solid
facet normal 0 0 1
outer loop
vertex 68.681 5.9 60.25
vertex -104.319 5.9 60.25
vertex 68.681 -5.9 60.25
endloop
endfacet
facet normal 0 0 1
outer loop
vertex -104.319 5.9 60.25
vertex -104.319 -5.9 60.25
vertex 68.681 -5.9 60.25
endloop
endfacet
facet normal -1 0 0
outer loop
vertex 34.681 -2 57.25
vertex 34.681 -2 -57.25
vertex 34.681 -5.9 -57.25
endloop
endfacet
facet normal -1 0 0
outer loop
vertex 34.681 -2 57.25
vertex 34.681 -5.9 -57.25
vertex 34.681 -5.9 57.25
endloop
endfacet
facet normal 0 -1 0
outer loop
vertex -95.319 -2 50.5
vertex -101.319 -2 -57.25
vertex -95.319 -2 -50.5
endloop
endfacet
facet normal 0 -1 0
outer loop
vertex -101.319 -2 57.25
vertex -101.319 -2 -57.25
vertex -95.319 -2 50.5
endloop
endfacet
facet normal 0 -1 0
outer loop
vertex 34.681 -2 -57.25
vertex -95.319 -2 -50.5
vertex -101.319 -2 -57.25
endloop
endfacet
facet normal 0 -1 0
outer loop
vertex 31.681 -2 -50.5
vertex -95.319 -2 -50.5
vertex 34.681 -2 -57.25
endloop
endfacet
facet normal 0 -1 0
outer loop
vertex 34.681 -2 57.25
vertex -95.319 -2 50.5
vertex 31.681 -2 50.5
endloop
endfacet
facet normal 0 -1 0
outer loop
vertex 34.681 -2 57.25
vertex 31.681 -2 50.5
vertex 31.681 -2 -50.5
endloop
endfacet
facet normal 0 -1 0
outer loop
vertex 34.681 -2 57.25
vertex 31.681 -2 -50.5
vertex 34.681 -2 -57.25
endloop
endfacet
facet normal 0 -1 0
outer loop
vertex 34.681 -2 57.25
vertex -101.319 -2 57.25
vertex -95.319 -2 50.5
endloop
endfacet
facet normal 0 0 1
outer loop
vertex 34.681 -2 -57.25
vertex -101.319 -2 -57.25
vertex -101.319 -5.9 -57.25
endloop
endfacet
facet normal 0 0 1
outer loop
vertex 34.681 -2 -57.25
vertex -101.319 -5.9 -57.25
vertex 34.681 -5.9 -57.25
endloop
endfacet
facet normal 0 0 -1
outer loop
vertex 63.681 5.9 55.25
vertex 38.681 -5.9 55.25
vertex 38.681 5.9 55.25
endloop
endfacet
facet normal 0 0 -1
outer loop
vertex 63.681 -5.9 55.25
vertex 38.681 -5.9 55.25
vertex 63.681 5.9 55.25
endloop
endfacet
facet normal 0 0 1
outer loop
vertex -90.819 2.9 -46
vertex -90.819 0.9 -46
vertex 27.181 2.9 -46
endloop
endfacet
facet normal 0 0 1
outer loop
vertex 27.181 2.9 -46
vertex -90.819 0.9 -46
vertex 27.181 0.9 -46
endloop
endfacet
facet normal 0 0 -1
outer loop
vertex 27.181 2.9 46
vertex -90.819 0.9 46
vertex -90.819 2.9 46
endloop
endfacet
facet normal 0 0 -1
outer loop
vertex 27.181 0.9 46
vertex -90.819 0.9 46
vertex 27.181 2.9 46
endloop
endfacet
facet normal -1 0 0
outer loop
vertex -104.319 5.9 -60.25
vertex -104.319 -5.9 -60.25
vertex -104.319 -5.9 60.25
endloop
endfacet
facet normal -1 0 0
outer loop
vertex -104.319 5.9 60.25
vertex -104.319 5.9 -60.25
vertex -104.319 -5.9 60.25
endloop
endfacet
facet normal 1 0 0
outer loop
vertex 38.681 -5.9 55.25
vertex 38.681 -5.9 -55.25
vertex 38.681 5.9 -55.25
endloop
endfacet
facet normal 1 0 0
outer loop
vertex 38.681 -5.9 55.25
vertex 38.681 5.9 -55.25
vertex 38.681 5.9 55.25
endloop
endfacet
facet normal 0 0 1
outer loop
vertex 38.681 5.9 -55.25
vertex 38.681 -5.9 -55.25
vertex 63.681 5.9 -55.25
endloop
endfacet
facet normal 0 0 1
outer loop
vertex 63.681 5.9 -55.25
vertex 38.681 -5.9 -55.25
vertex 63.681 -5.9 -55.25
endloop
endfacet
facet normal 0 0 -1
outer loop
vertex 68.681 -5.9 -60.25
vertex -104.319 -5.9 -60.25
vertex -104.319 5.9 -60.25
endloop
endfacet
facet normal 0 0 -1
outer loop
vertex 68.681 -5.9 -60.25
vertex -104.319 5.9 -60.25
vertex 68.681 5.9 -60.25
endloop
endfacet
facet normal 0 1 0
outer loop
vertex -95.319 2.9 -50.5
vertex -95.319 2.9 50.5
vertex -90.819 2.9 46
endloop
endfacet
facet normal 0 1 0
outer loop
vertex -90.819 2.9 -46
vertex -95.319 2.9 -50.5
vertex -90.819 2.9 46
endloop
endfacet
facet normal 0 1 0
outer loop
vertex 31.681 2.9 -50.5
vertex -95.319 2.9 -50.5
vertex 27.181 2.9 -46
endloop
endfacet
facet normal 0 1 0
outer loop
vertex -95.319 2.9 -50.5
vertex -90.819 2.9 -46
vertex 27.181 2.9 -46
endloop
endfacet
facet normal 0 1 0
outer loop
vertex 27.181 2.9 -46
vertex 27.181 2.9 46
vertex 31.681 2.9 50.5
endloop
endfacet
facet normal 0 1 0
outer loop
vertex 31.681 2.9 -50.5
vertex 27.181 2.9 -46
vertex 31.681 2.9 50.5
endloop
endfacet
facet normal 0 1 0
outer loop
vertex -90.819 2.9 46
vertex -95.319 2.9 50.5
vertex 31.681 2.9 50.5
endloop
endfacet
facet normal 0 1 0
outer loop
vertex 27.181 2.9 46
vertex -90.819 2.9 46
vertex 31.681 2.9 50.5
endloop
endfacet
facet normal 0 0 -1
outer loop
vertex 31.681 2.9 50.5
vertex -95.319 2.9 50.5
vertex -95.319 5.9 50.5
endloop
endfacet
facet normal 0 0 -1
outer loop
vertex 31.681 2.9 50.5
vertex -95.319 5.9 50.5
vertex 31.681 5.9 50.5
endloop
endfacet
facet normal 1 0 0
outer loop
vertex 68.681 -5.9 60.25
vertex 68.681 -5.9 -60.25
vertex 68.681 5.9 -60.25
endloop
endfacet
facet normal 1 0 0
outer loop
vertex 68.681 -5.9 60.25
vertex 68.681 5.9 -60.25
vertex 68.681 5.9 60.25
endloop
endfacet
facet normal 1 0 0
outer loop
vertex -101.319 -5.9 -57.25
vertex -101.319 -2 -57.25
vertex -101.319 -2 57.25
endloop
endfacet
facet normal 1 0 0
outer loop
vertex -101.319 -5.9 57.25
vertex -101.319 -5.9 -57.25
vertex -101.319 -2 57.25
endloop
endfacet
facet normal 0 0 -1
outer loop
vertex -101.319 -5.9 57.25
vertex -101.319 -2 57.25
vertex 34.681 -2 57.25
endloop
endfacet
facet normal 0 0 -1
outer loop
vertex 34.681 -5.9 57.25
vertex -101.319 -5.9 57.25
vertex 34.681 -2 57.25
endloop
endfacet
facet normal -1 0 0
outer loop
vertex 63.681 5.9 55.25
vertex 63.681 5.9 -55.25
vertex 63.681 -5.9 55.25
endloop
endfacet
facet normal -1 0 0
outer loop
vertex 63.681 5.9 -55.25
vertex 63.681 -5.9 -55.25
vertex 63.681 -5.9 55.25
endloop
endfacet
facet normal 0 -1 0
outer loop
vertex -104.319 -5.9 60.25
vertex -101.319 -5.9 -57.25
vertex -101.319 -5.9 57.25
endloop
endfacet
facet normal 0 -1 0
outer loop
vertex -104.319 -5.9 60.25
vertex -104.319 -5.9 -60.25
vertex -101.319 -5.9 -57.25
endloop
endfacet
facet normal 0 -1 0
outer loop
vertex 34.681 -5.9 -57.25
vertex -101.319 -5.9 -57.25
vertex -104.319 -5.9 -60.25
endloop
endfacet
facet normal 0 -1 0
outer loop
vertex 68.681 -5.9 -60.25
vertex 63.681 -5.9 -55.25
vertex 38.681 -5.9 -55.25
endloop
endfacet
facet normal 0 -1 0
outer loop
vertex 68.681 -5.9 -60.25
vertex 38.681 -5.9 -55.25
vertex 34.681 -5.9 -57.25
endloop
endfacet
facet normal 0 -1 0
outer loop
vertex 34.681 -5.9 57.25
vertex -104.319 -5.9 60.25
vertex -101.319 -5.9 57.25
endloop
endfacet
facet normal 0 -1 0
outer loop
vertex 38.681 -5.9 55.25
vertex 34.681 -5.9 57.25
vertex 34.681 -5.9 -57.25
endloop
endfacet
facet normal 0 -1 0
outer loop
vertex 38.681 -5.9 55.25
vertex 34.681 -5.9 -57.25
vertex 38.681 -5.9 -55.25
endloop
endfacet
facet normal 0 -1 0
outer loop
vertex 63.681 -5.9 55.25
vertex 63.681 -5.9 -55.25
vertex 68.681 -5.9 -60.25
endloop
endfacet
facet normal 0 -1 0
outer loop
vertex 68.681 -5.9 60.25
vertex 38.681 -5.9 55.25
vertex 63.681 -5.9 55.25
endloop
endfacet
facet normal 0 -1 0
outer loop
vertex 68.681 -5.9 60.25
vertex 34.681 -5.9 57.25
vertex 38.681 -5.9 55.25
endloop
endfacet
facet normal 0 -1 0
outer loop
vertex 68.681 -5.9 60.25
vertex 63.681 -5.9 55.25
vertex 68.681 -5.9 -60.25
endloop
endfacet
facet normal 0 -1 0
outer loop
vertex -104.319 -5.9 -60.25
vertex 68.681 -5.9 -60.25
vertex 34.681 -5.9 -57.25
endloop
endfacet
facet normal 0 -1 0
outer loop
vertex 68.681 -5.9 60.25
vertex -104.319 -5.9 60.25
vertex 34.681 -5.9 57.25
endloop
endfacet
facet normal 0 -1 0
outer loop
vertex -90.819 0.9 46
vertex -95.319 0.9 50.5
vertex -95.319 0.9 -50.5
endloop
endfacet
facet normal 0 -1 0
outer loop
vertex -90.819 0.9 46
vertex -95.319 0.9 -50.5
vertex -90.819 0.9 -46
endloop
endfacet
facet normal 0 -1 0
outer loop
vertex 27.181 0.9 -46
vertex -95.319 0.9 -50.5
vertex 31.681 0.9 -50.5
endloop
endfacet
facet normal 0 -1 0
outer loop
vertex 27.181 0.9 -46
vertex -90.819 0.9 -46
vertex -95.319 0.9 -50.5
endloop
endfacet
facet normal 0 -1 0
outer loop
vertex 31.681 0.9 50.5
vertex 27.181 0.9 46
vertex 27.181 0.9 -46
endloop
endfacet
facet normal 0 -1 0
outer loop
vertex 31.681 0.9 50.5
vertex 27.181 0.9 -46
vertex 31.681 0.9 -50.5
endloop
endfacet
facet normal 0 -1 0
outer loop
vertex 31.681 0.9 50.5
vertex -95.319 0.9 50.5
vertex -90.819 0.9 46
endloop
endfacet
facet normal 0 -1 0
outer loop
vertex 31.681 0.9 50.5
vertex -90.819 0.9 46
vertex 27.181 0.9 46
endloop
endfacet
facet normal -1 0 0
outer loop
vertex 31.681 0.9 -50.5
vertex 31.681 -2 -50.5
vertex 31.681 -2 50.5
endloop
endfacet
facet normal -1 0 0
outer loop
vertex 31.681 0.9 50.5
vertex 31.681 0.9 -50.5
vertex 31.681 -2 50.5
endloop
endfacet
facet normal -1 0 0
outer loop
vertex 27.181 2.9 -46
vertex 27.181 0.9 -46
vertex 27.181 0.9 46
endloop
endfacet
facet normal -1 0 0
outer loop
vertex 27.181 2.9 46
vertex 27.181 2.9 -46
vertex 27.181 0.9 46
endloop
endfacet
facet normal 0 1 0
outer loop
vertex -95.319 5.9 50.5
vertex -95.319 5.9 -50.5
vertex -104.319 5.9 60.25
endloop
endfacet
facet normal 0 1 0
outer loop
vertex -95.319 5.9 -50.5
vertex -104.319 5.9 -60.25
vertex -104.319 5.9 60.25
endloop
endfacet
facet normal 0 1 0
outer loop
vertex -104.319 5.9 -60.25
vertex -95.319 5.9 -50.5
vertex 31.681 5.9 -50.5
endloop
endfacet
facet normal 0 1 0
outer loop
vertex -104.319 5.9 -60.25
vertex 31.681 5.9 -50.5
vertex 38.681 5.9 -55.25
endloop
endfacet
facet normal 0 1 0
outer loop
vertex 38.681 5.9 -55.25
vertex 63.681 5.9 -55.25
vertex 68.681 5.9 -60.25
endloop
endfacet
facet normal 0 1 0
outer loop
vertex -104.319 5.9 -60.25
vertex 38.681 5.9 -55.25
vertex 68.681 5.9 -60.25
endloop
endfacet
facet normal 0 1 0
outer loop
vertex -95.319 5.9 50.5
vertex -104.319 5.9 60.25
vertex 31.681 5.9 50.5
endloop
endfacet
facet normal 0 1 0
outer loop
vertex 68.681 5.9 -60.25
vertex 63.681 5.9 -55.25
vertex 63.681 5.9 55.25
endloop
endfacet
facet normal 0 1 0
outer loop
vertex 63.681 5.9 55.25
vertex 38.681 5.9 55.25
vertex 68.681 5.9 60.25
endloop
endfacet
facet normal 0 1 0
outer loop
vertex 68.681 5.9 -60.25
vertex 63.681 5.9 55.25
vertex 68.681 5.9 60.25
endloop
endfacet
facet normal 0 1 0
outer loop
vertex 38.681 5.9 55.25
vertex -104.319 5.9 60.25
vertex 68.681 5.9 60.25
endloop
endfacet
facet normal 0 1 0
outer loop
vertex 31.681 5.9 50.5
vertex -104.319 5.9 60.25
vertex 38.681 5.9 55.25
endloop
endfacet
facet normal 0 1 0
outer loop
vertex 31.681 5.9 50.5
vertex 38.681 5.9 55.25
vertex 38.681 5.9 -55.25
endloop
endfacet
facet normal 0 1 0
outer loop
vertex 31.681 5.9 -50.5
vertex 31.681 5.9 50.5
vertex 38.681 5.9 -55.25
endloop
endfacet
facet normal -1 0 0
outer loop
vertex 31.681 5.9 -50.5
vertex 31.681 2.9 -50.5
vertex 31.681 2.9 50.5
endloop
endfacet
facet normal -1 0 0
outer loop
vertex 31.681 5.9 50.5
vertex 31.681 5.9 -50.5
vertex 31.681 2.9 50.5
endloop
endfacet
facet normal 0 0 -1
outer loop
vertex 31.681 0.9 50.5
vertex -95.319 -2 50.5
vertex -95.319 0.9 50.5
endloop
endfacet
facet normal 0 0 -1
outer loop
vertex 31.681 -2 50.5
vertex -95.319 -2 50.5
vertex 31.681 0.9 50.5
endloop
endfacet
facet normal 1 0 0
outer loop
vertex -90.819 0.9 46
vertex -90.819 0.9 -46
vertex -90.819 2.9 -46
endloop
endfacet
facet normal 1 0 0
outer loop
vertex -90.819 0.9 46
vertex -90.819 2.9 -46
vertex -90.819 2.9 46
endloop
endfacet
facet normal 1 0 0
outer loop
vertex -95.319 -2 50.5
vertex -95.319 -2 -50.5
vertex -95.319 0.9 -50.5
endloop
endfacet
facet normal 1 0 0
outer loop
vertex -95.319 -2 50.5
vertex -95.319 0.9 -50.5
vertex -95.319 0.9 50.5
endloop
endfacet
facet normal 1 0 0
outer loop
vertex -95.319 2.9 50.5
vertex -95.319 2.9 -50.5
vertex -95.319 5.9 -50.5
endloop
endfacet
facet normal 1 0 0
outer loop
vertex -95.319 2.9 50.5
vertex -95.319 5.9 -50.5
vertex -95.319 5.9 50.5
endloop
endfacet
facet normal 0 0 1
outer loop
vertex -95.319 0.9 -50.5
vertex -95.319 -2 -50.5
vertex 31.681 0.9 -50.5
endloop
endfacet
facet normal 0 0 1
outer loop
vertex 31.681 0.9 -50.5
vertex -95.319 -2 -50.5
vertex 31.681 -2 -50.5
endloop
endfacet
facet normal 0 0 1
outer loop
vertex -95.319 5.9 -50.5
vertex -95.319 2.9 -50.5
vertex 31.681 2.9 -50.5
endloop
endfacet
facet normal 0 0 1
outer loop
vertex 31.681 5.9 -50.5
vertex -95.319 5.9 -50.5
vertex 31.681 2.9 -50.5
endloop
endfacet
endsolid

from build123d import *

# Parameters (mm, degrees)
F0_W        = 173
F0_H        = 120.5
F0_W_2      = 136
F0_H_2      = 114.5
F0_W_3      = 25
F0_H_3      = 110.5
F0_W_4      = 127
F0_H_4      = 101
F1_DEPTH    = 5.9
F3_START    = -0.9
F0_W_5      = 118
F0_H_5      = 92
F1_FACE_W   = 173
F1_FACE_H   = 120.5
F1_FACE_W_2 = 25
F1_FACE_H_2 = 110.5
F1_FACE_W_3 = 127
F1_FACE_H_3 = 101
F3_DEPTH    = 2
F4_START    = 2
F4_DEPTH    = 4


with BuildPart() as f1:
    # F0 (on Front) → F1 (new body)
    with BuildSketch(Plane.XZ):
        with Locations((-17.8190767765, 0)):
            Rectangle(F0_W, F0_H)
        with Locations((-33.3190767765, 0)):
            Rectangle(F0_W_2, F0_H_2, mode=Mode.SUBTRACT)
        with Locations((51.1809232235, 0)):
            Rectangle(F0_W_3, F0_H_3, mode=Mode.SUBTRACT)
        with Locations((-33.3190767765, 0)):
            Rectangle(F0_W_2, F0_H_2)
        with Locations((-31.8190767765, 0)):
            Rectangle(F0_W_4, F0_H_4, mode=Mode.SUBTRACT)
    extrude(amount=F1_DEPTH)

    # F2: F1 across face


with BuildPart() as f1_1:
    add(f1.part)
    add(f1.part.mirror(Plane(origin=(-19.9180876192, 0, 0), x_dir=(1, 0, 0), z_dir=(0, 1, 0))))

    # F0 (on Front) + F1_face (on face) → F3 (join)
    with BuildSketch(Plane.XZ.offset(F3_START)):
        with Locations((-31.8190767765, 0)):
            Rectangle(F0_W_4, F0_H_4)
        with Locations((-31.8190767765, 0)):
            Rectangle(F0_W_5, F0_H_5, mode=Mode.SUBTRACT)
    with BuildSketch(Plane(origin=(-19.9180876192, -5.9, 0), x_dir=(1, 0, 0), z_dir=(0, -1, 0)).offset(F3_START)):
        with Locations((2.0990108427, 0)):
            Rectangle(F1_FACE_W, F1_FACE_H)
        with Locations((71.0990108427, 0)):
            Rectangle(F1_FACE_W_2, F1_FACE_H_2, mode=Mode.SUBTRACT)
        with Locations((-11.9009891573, 0)):
            Rectangle(F1_FACE_W_3, F1_FACE_H_3, mode=Mode.SUBTRACT)
    extrude(amount=-F3_DEPTH)

    # F0 (on Front) → F4 (cut)
    with BuildSketch(Plane.XZ.offset(F4_START)):
        with Locations((-33.3190767765, 0)):
            Rectangle(F0_W_2, F0_H_2)
        with Locations((-31.8190767765, 0)):
            Rectangle(F0_W_4, F0_H_4, mode=Mode.SUBTRACT)
    extrude(amount=F4_DEPTH, mode=Mode.SUBTRACT)


solid = f1_1.part
